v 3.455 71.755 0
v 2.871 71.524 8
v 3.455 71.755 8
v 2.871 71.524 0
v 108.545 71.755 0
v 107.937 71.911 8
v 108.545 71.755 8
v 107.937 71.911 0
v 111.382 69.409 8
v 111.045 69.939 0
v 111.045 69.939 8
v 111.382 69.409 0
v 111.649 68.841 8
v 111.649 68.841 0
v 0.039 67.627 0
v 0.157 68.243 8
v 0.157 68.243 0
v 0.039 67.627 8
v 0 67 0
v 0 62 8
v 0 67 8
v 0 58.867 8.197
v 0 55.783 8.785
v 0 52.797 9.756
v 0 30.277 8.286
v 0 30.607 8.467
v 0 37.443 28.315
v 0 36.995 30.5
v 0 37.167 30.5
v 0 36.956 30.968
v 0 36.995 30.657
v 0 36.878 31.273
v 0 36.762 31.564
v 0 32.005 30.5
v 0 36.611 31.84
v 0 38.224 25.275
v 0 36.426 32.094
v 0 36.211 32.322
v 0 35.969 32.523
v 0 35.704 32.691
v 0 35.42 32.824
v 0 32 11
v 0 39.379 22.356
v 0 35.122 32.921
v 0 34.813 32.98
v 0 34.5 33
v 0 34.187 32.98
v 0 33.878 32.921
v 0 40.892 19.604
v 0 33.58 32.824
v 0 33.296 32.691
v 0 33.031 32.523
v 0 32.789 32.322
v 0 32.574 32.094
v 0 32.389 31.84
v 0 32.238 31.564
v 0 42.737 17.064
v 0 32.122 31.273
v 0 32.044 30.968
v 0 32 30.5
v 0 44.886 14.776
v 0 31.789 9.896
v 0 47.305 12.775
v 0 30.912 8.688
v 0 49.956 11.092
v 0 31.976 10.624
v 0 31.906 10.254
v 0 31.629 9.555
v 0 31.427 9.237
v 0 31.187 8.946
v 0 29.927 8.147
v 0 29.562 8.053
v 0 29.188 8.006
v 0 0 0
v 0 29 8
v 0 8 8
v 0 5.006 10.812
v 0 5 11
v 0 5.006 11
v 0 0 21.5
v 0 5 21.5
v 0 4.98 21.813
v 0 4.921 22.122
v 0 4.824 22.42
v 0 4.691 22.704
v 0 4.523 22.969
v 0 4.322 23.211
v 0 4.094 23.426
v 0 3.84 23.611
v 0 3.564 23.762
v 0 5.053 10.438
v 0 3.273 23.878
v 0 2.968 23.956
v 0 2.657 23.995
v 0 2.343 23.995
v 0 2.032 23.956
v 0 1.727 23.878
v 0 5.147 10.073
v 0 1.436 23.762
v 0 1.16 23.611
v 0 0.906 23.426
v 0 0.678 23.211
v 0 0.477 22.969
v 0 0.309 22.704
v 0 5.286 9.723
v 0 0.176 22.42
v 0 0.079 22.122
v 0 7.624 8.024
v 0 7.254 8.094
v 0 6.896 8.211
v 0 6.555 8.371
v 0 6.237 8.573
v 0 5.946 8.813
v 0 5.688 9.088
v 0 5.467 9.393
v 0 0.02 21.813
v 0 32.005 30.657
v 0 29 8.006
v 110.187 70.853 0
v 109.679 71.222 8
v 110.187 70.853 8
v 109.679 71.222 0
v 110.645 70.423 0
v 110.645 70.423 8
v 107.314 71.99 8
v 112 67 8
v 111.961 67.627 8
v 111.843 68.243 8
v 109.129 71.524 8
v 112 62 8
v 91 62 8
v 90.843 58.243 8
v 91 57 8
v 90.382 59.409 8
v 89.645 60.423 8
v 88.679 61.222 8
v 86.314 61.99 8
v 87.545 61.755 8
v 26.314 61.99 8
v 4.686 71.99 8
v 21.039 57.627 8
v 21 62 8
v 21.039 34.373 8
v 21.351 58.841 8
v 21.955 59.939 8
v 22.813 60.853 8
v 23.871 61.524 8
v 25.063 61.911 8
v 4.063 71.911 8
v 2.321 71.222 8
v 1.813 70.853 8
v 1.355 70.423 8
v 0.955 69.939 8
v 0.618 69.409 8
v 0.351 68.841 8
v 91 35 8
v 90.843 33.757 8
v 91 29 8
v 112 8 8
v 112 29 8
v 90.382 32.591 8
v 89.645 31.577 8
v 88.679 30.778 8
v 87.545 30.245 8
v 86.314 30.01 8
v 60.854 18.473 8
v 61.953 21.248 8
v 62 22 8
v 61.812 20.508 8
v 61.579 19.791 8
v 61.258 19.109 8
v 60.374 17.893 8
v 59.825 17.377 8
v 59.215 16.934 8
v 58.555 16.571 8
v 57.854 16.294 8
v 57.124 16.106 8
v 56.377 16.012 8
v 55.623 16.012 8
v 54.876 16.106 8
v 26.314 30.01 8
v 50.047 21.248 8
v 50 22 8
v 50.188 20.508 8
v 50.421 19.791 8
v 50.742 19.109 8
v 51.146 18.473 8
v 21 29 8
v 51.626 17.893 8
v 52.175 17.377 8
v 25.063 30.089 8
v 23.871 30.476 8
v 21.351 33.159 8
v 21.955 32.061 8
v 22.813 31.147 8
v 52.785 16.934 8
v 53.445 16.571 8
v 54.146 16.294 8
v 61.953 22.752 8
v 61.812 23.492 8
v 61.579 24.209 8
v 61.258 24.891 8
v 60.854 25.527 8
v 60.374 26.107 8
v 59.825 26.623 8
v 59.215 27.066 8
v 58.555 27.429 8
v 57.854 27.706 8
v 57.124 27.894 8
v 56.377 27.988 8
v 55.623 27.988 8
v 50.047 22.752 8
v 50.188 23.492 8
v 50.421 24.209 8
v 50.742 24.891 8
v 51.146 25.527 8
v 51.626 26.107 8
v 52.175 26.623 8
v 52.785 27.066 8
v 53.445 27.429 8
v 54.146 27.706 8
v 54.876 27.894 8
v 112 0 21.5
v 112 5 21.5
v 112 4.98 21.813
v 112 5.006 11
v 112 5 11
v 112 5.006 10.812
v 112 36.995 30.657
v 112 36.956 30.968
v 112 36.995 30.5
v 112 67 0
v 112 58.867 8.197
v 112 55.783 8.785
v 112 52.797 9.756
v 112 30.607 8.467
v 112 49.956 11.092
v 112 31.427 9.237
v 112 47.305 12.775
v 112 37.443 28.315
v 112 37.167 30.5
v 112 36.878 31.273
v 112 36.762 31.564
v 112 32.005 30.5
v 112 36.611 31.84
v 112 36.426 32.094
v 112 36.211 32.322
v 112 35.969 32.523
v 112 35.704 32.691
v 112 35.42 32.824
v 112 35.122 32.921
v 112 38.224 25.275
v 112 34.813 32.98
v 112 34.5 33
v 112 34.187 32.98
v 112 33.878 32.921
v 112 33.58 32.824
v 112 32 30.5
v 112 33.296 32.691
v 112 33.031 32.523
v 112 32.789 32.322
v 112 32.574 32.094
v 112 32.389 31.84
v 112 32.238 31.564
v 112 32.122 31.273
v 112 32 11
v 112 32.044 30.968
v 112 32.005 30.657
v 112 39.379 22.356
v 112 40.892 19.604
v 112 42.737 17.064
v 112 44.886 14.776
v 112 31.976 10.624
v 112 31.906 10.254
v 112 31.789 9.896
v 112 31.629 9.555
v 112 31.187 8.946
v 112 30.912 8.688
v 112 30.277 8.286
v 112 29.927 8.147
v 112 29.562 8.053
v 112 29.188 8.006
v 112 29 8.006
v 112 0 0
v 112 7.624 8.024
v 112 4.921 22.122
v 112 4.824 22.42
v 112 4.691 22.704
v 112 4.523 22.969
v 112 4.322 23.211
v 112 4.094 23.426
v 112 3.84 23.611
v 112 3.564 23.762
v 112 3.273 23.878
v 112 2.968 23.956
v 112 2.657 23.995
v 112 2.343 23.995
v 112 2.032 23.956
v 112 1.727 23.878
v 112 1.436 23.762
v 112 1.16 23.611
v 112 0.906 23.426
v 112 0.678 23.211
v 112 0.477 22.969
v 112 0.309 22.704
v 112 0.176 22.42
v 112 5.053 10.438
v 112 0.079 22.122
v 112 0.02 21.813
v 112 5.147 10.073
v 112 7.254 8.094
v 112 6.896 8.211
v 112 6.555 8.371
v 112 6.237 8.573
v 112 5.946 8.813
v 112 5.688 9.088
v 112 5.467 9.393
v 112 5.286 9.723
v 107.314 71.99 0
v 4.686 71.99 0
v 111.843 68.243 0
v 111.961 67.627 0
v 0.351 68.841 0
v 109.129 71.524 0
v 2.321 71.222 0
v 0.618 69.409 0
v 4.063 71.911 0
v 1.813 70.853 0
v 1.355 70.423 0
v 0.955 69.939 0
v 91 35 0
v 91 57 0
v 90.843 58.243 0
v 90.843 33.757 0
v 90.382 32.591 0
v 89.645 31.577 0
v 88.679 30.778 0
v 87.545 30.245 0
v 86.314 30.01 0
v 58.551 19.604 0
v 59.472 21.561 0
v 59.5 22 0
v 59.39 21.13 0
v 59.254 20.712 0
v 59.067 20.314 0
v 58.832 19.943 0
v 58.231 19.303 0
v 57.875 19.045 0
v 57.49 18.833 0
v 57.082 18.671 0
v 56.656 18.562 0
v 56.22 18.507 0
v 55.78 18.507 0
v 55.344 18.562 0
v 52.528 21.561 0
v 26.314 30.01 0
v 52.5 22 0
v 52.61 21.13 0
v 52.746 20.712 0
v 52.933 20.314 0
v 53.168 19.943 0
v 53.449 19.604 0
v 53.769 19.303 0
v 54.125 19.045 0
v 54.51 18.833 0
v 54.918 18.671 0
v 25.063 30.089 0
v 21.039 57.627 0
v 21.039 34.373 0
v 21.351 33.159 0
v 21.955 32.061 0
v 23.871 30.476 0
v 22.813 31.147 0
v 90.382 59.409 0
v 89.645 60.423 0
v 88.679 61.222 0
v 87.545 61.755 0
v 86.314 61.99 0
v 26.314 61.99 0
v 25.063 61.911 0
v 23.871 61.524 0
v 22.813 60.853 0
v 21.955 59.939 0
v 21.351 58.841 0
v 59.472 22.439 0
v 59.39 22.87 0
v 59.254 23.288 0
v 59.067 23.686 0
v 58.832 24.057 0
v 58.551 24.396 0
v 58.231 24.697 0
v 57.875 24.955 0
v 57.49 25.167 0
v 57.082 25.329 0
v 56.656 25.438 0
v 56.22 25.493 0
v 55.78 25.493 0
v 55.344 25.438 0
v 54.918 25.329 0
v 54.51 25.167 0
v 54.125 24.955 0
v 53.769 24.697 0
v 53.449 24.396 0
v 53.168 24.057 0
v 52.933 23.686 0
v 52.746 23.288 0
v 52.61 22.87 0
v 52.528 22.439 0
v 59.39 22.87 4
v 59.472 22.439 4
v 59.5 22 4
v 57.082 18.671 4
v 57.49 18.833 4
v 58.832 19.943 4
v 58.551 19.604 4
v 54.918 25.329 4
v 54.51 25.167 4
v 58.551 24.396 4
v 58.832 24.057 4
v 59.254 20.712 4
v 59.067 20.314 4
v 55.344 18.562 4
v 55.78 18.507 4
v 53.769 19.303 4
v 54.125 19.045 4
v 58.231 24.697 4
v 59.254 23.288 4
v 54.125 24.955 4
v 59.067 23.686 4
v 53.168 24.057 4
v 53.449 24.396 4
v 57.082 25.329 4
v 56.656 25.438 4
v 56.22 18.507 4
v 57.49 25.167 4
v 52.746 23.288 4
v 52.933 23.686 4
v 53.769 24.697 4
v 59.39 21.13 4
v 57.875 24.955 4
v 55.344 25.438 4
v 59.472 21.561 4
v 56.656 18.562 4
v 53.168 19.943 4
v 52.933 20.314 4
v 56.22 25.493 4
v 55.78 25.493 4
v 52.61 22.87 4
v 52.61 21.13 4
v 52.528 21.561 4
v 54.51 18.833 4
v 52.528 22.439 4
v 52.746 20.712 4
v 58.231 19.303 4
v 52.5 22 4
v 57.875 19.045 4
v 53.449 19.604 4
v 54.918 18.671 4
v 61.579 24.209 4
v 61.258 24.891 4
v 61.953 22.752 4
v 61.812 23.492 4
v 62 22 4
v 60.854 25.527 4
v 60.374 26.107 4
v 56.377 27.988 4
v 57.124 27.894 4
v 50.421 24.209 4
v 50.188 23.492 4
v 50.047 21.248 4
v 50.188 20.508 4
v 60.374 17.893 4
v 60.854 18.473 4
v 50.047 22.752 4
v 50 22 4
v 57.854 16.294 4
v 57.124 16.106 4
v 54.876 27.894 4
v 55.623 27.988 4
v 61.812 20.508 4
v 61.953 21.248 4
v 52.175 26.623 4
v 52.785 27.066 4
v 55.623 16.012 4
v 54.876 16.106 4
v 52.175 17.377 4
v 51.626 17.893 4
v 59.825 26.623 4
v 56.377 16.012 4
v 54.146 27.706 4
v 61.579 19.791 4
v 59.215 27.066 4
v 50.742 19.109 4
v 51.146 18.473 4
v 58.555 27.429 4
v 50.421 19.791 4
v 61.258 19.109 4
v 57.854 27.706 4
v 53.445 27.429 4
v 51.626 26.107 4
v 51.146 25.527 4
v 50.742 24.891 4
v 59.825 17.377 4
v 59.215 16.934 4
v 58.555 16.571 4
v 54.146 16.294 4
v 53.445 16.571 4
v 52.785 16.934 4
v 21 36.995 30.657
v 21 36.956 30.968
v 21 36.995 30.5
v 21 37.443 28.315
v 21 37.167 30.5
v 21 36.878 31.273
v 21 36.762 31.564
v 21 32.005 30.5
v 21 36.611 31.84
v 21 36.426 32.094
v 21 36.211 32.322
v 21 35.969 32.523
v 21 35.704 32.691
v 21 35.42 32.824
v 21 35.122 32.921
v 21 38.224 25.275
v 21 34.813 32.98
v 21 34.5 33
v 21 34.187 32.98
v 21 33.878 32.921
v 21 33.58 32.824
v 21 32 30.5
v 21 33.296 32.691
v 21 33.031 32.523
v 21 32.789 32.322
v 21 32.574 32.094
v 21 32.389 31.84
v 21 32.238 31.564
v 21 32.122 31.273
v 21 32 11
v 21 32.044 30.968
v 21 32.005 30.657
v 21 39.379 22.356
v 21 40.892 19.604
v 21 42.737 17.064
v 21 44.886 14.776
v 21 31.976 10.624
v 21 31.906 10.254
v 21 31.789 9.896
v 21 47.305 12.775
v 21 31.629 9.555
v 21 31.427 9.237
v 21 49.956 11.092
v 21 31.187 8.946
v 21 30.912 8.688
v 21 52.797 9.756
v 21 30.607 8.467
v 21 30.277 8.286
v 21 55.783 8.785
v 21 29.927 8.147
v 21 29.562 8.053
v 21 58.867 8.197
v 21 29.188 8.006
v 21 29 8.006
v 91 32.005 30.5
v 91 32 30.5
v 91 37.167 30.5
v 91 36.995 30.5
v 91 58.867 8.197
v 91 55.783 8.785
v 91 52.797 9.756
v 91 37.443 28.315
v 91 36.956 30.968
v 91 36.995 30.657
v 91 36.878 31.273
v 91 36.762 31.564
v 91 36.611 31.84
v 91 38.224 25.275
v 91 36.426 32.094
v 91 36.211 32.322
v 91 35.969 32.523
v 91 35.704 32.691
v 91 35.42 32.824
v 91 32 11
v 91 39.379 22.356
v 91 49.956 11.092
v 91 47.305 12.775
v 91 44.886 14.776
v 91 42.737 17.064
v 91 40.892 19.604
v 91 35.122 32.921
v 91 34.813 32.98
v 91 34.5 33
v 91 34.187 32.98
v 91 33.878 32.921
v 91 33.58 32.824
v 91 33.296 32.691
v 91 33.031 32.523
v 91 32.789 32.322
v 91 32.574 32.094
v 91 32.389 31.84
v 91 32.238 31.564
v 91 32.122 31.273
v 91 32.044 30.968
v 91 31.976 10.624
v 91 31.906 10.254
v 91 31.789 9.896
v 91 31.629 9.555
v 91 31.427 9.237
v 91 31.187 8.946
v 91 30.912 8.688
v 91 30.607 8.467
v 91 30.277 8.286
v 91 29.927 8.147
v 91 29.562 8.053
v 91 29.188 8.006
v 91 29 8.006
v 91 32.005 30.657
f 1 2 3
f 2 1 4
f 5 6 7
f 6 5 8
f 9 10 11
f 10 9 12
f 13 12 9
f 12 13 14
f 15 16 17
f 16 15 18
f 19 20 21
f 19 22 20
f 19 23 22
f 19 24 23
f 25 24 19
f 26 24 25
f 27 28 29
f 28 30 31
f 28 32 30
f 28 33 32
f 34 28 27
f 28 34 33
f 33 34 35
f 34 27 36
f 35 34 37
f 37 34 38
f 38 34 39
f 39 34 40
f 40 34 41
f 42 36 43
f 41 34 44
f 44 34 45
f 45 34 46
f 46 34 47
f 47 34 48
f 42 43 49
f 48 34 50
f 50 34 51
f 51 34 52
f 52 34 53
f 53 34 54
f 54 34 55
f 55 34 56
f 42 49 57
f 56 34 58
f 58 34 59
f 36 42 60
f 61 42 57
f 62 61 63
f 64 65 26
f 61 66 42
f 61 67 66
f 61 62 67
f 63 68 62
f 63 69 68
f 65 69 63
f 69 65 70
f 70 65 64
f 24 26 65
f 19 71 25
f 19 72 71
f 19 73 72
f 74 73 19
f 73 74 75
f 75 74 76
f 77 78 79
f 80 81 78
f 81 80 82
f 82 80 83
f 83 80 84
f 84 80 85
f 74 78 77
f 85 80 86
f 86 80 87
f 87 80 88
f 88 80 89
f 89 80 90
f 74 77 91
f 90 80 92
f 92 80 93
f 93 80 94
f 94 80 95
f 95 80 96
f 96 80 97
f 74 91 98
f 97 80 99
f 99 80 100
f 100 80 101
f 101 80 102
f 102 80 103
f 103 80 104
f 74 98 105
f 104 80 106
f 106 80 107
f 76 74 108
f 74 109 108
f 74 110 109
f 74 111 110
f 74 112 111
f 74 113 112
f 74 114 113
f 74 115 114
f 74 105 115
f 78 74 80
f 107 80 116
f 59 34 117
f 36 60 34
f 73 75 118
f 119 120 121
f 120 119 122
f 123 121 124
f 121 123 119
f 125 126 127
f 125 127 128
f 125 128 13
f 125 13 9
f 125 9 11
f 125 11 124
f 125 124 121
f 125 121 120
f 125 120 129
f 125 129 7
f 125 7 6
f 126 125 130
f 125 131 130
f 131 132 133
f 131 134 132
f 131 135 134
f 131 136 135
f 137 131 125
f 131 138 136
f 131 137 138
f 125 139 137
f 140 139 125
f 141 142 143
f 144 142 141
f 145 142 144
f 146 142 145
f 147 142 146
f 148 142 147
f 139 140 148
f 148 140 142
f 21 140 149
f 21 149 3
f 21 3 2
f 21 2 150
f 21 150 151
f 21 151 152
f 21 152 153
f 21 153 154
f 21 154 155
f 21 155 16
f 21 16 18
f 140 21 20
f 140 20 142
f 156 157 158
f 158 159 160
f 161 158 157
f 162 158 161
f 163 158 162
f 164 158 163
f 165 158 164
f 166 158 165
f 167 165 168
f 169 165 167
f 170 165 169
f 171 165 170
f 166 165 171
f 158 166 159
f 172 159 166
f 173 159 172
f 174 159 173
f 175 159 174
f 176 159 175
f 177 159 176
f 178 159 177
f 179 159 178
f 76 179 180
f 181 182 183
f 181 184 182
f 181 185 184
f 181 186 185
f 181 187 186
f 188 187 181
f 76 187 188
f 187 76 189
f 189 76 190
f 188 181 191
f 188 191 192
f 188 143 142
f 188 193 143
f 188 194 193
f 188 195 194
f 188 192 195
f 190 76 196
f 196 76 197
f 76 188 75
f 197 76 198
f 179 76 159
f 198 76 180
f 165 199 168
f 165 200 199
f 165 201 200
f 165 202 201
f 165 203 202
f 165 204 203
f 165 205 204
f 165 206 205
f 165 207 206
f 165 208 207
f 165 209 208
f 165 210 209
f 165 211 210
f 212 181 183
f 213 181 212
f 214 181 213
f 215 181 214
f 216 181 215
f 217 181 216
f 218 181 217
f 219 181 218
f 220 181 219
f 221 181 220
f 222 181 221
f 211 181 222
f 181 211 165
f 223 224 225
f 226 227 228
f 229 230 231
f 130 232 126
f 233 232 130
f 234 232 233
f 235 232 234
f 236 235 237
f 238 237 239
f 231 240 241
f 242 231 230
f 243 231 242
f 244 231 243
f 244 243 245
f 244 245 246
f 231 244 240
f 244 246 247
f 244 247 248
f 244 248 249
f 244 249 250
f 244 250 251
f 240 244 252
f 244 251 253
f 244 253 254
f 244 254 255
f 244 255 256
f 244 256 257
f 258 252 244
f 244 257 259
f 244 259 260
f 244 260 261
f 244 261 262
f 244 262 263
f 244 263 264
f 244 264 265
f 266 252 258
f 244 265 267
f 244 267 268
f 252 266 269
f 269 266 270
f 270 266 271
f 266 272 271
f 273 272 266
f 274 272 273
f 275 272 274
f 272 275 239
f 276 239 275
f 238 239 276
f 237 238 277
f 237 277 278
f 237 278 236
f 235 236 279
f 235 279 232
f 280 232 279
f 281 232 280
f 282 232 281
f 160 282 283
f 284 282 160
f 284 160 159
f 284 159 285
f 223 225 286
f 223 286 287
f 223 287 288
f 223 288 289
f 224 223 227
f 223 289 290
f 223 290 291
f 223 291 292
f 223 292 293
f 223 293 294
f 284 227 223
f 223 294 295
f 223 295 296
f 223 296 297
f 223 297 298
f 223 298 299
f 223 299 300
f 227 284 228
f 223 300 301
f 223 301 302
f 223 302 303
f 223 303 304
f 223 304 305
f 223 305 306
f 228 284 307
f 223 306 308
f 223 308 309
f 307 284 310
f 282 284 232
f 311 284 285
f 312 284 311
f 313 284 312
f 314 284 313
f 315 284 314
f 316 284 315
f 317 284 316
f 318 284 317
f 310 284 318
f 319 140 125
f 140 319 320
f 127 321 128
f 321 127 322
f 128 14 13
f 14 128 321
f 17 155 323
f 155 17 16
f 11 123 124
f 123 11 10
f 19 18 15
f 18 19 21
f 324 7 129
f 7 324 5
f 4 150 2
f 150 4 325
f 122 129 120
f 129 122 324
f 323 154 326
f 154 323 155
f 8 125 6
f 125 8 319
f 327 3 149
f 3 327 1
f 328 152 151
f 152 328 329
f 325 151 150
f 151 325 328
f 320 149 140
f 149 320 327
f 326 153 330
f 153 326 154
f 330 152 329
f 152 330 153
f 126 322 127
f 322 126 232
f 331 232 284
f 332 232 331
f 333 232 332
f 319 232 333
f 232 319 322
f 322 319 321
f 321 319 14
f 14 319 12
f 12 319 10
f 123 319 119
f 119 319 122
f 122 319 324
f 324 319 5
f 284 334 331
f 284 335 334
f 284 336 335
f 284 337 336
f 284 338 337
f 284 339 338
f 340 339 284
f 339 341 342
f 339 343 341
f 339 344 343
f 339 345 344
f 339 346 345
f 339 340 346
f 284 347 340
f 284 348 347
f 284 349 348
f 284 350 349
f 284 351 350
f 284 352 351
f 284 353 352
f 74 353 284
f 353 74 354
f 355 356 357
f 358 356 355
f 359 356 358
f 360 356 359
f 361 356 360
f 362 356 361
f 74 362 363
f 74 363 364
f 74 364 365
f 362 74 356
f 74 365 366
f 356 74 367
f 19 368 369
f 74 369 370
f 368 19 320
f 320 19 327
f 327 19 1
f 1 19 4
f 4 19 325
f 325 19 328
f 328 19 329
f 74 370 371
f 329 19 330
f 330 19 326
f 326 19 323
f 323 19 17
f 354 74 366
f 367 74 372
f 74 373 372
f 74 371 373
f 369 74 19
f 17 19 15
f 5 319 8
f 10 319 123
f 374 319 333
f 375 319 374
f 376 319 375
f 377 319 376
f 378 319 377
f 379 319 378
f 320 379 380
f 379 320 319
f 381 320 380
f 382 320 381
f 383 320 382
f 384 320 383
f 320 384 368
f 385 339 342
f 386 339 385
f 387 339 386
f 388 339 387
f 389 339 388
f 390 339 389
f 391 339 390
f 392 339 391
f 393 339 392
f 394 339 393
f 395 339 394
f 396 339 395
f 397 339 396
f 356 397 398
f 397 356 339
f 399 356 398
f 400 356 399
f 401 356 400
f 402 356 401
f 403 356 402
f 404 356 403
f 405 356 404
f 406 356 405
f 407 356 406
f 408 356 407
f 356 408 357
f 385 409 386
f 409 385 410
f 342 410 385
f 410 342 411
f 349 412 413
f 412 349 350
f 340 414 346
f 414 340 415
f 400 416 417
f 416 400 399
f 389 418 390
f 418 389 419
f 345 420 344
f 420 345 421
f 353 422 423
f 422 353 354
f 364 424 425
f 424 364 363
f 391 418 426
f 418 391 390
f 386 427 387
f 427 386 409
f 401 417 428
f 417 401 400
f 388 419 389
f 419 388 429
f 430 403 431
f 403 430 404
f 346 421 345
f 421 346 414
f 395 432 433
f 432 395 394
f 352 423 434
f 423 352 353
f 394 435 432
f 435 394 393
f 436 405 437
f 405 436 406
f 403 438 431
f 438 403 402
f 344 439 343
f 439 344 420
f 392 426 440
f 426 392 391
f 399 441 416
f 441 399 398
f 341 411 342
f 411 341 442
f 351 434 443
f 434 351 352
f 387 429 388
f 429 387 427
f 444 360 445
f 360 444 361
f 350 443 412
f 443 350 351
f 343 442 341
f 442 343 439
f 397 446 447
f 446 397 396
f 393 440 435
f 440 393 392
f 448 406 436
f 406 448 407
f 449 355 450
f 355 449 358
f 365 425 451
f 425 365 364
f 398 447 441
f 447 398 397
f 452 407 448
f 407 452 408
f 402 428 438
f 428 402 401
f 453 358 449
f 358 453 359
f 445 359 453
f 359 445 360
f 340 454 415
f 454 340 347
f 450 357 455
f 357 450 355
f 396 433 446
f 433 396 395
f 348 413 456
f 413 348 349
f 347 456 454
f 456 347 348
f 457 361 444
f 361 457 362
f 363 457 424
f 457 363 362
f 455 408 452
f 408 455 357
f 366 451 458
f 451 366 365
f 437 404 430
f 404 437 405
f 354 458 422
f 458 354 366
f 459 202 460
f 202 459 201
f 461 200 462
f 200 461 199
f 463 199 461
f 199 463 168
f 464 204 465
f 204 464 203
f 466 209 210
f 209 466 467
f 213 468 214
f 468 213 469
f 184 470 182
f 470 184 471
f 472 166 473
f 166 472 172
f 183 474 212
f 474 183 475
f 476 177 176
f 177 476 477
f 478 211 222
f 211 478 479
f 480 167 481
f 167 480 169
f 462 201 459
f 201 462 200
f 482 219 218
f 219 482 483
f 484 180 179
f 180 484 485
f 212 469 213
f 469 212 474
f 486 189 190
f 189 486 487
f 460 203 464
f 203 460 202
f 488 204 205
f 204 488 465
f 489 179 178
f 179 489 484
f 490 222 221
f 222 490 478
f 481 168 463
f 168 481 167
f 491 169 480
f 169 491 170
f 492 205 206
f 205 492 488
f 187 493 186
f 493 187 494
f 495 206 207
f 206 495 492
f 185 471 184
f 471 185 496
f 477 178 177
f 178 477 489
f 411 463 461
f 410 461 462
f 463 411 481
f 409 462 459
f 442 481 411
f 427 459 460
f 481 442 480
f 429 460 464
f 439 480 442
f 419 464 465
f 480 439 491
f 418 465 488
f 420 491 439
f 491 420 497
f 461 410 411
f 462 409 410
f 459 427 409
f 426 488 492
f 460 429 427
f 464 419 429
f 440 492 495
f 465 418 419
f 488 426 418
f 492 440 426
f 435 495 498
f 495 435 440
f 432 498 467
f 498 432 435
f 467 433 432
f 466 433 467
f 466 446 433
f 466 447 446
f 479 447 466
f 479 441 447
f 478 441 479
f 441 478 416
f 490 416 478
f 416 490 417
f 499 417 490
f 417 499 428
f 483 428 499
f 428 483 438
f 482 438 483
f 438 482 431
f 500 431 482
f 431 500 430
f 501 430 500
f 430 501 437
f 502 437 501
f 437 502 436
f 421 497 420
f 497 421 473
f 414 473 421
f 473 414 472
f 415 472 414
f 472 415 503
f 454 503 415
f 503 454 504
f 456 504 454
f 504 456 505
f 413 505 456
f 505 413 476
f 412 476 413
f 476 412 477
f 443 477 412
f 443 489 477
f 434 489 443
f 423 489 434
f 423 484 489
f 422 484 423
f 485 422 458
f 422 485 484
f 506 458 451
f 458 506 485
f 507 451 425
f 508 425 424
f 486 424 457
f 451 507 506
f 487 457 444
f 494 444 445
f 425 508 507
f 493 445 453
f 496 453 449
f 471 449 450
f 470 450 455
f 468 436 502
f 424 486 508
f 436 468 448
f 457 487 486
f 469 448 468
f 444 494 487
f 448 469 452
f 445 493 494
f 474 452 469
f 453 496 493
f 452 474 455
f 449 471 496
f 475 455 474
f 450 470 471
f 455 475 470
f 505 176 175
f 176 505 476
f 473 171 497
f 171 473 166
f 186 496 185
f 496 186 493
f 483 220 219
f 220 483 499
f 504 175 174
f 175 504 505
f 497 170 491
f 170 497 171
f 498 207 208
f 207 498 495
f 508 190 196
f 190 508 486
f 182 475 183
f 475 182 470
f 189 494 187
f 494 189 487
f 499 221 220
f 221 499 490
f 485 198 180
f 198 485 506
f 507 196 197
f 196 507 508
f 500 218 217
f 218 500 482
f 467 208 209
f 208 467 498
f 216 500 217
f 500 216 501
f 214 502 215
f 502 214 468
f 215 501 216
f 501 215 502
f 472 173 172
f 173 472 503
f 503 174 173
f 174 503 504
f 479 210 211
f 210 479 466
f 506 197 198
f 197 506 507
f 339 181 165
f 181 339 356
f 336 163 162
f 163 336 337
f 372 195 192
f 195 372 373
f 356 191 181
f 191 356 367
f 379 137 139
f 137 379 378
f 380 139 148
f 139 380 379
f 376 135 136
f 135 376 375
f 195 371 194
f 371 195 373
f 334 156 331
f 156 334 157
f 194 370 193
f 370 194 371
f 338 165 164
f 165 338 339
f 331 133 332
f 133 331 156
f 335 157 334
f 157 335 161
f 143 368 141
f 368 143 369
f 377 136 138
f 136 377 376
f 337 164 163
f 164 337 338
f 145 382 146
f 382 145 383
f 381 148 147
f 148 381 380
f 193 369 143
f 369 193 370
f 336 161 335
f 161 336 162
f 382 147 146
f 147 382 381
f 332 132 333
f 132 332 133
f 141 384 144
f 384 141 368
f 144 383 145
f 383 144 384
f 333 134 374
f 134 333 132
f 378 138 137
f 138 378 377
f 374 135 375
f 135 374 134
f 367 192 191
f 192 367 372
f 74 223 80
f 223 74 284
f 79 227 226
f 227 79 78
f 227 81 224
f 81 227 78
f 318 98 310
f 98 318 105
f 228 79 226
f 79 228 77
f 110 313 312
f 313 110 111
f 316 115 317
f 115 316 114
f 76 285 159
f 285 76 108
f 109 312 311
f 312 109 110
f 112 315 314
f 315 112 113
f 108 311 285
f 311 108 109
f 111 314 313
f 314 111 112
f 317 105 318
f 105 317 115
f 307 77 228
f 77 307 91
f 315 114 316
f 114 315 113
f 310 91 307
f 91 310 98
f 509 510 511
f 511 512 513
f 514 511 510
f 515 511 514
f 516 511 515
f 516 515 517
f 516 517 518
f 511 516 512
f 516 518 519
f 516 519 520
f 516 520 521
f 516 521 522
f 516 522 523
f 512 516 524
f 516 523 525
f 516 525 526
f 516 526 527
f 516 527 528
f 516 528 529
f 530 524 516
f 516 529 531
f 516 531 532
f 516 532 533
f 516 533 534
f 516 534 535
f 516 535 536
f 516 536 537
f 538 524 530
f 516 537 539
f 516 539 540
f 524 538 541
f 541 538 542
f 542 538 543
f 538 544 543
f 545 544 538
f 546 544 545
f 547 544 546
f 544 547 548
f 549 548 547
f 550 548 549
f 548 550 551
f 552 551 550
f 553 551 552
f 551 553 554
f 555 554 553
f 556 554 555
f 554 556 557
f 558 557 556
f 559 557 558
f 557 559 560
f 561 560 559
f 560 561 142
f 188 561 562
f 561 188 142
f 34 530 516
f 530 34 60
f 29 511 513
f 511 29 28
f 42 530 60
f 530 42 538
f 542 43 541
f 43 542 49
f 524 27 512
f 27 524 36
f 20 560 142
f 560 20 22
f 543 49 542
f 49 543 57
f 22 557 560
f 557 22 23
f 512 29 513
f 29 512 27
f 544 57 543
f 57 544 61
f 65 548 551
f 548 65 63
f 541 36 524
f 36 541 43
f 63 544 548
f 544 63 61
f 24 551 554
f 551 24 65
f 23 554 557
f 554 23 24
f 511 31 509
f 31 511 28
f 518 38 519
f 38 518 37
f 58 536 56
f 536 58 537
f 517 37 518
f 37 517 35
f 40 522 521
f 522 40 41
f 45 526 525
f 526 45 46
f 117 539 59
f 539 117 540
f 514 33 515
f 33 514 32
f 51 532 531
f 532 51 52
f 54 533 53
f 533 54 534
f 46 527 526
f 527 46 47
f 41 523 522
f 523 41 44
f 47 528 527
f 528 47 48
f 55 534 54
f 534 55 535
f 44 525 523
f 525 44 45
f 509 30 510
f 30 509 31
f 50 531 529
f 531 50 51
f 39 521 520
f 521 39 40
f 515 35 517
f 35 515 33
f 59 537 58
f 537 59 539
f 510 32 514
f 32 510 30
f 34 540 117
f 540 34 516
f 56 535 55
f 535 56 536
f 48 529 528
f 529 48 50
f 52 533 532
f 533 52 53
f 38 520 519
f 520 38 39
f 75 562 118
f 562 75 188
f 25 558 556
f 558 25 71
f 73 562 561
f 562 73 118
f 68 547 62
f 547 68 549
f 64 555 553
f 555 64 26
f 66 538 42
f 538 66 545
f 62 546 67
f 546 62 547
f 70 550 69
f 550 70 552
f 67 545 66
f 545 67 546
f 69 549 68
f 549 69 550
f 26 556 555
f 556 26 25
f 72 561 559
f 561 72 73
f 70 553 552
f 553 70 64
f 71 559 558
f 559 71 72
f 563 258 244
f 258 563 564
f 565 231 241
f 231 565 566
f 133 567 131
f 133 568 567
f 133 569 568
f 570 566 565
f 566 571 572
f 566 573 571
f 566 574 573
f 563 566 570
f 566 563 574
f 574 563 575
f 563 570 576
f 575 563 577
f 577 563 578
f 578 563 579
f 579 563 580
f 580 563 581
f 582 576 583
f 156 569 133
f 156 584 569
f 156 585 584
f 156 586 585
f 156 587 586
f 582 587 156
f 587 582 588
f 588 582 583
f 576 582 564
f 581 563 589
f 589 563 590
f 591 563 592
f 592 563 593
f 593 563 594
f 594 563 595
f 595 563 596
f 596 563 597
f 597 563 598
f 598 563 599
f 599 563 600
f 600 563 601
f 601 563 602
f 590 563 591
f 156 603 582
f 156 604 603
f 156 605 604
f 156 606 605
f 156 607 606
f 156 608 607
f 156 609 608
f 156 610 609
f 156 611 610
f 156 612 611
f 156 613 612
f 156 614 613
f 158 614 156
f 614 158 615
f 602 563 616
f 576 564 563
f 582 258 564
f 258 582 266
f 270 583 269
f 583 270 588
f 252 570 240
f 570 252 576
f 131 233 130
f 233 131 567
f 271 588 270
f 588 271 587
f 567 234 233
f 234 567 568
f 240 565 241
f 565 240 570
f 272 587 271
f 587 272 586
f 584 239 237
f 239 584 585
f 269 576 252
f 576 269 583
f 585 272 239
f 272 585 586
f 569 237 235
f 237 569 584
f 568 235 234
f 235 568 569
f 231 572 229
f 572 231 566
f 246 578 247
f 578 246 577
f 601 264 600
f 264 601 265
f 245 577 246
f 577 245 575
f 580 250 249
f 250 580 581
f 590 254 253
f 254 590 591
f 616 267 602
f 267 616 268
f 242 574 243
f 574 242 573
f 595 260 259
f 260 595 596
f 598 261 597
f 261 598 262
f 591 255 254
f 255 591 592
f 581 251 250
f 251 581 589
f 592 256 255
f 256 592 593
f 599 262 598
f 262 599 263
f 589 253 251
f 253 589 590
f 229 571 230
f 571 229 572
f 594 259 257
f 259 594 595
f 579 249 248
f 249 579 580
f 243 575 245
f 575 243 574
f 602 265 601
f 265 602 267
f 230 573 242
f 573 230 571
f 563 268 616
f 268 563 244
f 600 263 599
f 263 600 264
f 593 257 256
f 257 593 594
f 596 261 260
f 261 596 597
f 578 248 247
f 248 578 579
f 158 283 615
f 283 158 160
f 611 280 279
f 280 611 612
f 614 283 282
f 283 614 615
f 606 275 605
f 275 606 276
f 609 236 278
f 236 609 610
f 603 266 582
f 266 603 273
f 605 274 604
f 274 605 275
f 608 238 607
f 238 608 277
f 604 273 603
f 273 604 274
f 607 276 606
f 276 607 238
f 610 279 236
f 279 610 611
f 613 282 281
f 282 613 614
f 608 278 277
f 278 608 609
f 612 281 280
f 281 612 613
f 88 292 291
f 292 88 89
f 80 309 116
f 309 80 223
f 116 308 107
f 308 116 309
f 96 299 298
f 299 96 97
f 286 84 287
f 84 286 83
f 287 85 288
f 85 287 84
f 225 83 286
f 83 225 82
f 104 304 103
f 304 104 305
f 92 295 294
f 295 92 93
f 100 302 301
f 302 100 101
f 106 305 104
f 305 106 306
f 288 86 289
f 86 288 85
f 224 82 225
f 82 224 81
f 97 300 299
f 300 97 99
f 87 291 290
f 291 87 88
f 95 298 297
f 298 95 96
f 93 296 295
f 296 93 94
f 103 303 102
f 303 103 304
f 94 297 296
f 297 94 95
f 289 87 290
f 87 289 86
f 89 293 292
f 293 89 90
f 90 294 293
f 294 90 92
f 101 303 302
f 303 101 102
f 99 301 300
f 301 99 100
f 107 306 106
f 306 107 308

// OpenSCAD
$fn=50;
base_thickness=8;
clamp_thickness=5;
front_clamp_height=16;
clamp_back_height=25;
clamp_gap=27;
clamp_inner_cornice_radius=3;

base(base_thickness);

//Front Clamp
rotate([90,0,90])
    roundedCube([clamp_thickness,front_clamp_height+base_thickness,112],clamp_thickness/2);
translate([0,clamp_thickness,base_thickness])
    cornice(clamp_inner_cornice_radius,112);


//back clamp
translate([0,clamp_gap+clamp_thickness,base_thickness])
    clamp_back(clamp_back_height, clamp_thickness,21);
translate([0,clamp_thickness+clamp_gap,base_thickness])
    rotate([90])
        cornice(clamp_inner_cornice_radius,21);
//back clamp
translate([112-21,clamp_gap+clamp_thickness,base_thickness])
    clamp_back(clamp_back_height, clamp_thickness,21);
translate([112-21,clamp_thickness+clamp_gap,base_thickness])
    rotate([90])
        cornice(clamp_inner_cornice_radius,21);


module base(thickness){
    difference(){
            roundedCube([112, 72, thickness], 5);
            translate([56,22,0])cylinder(thickness,3.5,3.5);
            translate([56,22,thickness/2])cylinder(thickness,6,6);
            translate([21,30,0])roundedCube([70,32,thickness],5,$fn=25);
    }
    cube([112,thickness,thickness]);
}

module roundedCube(size, r)
{
	x = size[0];
	y = size[1];
	z = size[2];

    hull(){
        translate([r, r, 0]) cylinder(z,r, r);
        translate([x-r, r, 0]) cylinder(z,r, r);
        translate([r, y-r, 0]) cylinder(z,r, r);
        translate([x-r, y-r, 0]) cylinder(z,r, r);
    }
}

module cornice(radius, length){
    
    difference(){
        cube([length, radius, radius]);
        translate([0,radius,radius])rotate([0,90,0])cylinder(length, radius, radius);
    }
    
    
}

module clamp_back(height, thickness, width){
    
    difference(){
        cube([width, height+thickness,height-(thickness/2)]);
        translate([0,height+thickness,height])rotate([0,90,0])cylinder(width, height, height);
    }
    translate([0,thickness/2,height-(thickness/2)])rotate([0,90,0])cylinder(width,thickness/2,thickness/2);
    
}
